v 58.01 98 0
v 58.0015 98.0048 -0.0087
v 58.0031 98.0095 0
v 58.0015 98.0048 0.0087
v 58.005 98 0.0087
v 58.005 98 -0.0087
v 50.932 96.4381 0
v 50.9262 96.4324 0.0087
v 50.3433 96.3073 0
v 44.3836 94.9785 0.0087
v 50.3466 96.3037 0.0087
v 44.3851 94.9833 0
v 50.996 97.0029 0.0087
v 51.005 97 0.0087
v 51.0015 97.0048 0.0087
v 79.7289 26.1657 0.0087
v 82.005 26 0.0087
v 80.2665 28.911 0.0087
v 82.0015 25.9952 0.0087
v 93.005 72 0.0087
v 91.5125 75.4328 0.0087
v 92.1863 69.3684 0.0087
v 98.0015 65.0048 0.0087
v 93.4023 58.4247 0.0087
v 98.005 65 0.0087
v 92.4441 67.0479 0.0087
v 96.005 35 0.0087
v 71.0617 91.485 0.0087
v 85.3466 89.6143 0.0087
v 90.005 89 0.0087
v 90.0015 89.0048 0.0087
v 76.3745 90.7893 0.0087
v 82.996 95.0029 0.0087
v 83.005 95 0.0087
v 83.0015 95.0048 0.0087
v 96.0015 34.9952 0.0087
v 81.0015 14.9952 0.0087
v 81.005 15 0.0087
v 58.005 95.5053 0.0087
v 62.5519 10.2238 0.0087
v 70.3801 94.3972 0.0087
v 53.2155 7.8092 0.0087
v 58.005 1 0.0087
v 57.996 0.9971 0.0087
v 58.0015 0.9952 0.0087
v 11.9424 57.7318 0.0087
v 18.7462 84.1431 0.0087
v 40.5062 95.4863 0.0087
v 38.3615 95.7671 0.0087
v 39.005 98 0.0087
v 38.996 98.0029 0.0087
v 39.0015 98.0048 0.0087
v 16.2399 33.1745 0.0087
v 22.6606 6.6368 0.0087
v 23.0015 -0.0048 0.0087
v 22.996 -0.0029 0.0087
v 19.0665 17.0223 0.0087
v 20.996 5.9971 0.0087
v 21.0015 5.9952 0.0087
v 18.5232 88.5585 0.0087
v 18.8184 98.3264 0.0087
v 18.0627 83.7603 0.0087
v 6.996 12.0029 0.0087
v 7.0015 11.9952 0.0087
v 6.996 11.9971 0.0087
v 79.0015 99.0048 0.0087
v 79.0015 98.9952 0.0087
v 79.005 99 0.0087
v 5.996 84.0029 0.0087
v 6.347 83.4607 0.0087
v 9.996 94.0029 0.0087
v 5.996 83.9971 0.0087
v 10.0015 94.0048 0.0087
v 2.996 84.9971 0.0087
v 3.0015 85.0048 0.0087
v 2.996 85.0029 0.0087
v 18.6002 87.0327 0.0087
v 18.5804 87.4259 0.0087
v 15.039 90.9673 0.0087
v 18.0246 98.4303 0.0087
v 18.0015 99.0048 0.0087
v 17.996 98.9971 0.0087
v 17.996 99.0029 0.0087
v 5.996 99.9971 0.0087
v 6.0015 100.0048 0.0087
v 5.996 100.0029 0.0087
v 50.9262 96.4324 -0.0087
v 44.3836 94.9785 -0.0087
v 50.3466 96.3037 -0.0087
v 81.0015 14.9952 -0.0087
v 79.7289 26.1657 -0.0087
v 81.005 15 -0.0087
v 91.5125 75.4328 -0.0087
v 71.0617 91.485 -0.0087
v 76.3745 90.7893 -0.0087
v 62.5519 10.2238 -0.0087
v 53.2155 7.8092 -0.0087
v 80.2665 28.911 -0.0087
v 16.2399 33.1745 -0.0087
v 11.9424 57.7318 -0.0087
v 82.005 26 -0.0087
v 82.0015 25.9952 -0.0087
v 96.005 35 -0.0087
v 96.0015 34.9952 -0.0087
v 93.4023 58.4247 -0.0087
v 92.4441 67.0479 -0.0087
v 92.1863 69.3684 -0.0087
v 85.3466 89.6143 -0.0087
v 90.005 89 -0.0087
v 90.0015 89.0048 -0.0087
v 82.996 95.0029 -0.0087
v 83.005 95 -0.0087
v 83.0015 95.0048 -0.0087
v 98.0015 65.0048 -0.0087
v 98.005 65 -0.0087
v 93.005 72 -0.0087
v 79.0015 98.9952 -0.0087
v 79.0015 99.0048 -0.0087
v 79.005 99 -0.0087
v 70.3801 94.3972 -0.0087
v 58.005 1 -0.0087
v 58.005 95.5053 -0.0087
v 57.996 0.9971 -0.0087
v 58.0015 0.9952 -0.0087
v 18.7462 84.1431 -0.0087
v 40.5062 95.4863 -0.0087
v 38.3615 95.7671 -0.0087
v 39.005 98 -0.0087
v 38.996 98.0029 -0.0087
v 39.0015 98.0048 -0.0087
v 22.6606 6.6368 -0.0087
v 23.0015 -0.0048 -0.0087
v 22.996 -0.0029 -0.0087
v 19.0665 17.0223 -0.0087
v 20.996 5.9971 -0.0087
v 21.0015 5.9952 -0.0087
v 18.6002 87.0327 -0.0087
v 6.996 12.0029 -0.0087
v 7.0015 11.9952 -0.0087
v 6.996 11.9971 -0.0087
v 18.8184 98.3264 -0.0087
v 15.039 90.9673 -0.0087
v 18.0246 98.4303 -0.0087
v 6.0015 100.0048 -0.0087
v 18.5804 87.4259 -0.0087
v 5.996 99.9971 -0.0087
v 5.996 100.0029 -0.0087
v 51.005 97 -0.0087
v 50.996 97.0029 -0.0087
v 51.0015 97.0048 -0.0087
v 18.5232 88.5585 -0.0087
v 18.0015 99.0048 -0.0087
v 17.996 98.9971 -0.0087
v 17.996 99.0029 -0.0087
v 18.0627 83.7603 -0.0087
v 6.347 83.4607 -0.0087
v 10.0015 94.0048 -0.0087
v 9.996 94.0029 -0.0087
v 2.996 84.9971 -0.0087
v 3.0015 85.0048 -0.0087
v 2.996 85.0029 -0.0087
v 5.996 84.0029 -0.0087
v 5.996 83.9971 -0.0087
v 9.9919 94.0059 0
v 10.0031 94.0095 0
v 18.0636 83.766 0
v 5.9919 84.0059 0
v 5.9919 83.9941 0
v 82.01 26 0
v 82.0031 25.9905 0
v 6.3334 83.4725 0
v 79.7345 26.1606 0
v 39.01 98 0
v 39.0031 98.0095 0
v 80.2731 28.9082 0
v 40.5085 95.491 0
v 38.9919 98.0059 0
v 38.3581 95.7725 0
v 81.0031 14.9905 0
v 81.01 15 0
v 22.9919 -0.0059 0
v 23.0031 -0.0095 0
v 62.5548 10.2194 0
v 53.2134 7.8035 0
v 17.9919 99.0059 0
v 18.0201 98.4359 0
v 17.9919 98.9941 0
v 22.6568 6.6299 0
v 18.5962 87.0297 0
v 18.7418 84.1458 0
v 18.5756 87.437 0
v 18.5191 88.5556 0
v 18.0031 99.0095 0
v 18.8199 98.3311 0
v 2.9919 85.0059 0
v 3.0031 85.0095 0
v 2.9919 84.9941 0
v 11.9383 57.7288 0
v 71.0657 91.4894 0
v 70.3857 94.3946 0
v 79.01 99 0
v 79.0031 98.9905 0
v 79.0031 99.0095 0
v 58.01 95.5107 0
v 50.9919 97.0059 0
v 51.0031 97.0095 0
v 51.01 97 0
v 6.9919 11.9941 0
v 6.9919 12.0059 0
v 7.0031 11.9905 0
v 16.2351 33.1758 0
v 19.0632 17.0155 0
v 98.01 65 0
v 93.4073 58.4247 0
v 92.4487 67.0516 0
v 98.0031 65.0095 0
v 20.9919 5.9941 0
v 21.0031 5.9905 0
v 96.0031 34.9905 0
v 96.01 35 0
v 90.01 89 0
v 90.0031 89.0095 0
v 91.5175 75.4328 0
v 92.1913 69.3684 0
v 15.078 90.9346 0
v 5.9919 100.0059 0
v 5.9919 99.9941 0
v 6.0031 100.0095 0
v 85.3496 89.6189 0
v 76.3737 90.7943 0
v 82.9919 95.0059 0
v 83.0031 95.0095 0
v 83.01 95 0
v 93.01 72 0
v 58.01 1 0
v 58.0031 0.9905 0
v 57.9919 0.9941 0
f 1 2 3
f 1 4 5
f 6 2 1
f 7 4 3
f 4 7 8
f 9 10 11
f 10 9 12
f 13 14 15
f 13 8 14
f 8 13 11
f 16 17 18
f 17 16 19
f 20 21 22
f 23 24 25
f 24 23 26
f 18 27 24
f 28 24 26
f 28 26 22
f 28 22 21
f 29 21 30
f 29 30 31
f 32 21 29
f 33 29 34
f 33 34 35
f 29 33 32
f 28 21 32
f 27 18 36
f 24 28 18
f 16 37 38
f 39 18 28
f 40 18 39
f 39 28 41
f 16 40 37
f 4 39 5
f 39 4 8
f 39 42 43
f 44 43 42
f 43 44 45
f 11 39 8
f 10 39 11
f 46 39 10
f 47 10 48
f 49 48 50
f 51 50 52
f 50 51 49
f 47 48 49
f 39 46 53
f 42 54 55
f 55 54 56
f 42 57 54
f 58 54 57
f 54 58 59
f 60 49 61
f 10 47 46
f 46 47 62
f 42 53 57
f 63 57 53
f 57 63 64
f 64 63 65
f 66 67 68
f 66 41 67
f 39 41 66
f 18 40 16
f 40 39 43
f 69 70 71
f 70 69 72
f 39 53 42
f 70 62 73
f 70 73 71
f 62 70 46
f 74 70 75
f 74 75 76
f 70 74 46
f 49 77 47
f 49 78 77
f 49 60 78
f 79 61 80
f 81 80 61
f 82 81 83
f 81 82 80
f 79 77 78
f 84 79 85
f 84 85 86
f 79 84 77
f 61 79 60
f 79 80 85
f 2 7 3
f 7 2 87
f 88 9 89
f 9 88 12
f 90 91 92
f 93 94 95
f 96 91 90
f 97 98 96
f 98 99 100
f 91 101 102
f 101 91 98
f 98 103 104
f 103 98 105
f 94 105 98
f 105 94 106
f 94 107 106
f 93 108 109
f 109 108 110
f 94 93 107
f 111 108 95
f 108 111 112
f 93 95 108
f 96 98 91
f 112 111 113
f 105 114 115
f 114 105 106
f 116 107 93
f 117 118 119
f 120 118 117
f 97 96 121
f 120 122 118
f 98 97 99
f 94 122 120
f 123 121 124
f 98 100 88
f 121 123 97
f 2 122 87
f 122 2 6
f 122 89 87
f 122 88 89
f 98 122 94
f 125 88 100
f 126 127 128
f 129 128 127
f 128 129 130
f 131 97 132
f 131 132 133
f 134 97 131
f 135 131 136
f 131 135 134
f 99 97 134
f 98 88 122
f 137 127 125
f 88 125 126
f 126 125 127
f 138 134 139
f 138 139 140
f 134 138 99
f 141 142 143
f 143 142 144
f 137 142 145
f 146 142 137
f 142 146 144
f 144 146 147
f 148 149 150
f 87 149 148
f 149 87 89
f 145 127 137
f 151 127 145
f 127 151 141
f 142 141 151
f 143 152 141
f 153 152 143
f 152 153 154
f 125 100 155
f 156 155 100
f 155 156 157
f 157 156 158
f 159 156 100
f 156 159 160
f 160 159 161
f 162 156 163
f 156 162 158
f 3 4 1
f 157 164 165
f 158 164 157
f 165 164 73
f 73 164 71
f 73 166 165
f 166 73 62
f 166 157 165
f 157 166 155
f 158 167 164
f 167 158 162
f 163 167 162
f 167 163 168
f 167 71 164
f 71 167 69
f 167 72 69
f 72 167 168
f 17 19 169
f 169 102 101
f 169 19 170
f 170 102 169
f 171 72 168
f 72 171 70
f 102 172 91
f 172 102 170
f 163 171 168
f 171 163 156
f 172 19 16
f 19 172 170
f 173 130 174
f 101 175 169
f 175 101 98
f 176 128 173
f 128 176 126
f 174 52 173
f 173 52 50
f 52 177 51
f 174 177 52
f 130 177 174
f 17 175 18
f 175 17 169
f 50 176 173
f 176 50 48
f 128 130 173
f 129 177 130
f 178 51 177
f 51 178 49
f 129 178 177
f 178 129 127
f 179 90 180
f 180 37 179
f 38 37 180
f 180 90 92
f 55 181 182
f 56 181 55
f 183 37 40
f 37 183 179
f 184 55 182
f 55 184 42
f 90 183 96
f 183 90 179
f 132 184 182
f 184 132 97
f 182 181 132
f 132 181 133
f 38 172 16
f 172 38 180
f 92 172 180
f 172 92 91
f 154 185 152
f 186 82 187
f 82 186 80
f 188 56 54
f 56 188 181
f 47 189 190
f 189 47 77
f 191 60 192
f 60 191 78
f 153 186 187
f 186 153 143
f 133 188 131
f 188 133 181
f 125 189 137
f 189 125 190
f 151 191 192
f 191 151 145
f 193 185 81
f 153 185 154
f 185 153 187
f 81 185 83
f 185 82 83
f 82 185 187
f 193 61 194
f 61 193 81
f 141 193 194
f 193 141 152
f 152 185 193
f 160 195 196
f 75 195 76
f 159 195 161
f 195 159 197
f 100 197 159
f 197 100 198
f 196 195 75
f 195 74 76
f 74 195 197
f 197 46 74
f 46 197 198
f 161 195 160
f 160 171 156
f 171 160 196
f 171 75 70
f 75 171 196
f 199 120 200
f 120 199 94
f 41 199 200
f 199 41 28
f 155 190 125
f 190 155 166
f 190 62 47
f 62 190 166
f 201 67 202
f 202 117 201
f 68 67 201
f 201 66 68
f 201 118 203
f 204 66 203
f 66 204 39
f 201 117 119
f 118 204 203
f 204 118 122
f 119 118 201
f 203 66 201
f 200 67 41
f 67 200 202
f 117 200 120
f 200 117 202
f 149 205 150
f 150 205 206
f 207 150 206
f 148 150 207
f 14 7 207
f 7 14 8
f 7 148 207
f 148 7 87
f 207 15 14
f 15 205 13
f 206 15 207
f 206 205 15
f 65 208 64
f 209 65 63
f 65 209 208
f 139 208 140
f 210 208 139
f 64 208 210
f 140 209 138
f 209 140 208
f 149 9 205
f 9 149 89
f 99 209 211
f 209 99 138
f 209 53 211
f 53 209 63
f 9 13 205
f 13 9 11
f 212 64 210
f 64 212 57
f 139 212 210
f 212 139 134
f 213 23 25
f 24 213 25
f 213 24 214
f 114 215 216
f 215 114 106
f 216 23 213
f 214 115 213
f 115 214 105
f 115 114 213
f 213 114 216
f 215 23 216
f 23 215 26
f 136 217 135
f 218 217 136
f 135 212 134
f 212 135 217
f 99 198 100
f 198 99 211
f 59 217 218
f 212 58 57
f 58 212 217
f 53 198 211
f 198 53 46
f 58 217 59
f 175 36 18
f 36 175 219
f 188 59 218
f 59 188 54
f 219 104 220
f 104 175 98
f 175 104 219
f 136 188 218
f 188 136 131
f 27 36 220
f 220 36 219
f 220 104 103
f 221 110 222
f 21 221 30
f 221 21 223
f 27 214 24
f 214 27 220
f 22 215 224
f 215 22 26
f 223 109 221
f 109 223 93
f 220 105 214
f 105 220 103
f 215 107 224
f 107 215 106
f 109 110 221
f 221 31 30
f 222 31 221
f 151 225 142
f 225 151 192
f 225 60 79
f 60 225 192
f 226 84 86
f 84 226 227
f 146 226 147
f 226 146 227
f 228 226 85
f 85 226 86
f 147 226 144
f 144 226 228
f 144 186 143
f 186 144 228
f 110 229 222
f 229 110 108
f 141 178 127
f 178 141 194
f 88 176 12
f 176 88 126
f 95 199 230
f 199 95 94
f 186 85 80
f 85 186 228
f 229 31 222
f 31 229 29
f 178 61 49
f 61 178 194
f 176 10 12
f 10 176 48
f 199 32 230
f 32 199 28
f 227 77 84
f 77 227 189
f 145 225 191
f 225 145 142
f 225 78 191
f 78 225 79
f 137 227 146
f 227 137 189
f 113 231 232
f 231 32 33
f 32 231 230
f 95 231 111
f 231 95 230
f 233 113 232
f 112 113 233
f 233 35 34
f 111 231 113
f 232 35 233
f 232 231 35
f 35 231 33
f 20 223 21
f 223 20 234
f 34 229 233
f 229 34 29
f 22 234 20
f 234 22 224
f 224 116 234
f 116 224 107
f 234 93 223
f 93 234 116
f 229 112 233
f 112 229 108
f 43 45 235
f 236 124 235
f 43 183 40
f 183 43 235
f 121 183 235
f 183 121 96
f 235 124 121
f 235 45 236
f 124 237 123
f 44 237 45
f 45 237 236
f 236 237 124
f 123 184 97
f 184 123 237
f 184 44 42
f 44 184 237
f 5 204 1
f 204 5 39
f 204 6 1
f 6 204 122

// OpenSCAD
color([0.6107800780239486,0.9541913078580654,0.09369719926319908]) hull(){
    translate([18,58]) sphere(0.01);
    translate([58,98]) sphere(0.01);
    translate([22,90]) sphere(0.01);
}
color([0.4396226851829427,0.9817497074141792,0.30111933510979894]) hull(){
    translate([58,98]) sphere(0.01);
    translate([22,90]) sphere(0.01);
    translate([50,93]) sphere(0.01);
}
color([0.08571041628526821,0.691130580335744,0.16573157374072334]) hull(){
    translate([22,90]) sphere(0.01);
    translate([50,93]) sphere(0.01);
    translate([44,55]) sphere(0.01);
}
color([0.4668304924867862,0.30100213617539295,0.3511677492745029]) hull(){
    translate([50,93]) sphere(0.01);
    translate([44,55]) sphere(0.01);
    translate([64,14]) sphere(0.01);
}
color([0.05564944269037686,0.7696481469448815,0.686275624239137]) hull(){
    translate([44,55]) sphere(0.01);
    translate([64,14]) sphere(0.01);
    translate([68,15]) sphere(0.01);
}
color([0.15447252119296884,0.35335085758162643,0.18799175914388588]) hull(){
    translate([64,14]) sphere(0.01);
    translate([68,15]) sphere(0.01);
    translate([10,94]) sphere(0.01);
}
color([0.41322879780265653,0.82270842281296,0.9057146612667819]) hull(){
    translate([68,15]) sphere(0.01);
    translate([10,94]) sphere(0.01);
    translate([58,33]) sphere(0.01);
}
color([0.9688547633127277,0.5528378273263655,0.12760284187612392]) hull(){
    translate([10,94]) sphere(0.01);
    translate([58,33]) sphere(0.01);
    translate([6,84]) sphere(0.01);
}
color([0.1710979555253146,0.7131998843266452,0.6397779425125977]) hull(){
    translate([58,33]) sphere(0.01);
    translate([6,84]) sphere(0.01);
    translate([82,26]) sphere(0.01);
}
color([0.57496968906483,0.8489371230716904,0.07944838941339594]) hull(){
    translate([6,84]) sphere(0.01);
    translate([82,26]) sphere(0.01);
    translate([42,29]) sphere(0.01);
}
color([0.040333123224873146,0.9305910632054132,0.3080440975445232]) hull(){
    translate([82,26]) sphere(0.01);
    translate([42,29]) sphere(0.01);
    translate([39,98]) sphere(0.01);
}
color([0.6084655882345898,0.4923441190446234,0.7069385087242315]) hull(){
    translate([42,29]) sphere(0.01);
    translate([39,98]) sphere(0.01);
    translate([26,22]) sphere(0.01);
}
color([0.6803385961846494,0.18024793645131376,0.10787678186317007]) hull(){
    translate([39,98]) sphere(0.01);
    translate([26,22]) sphere(0.01);
    translate([18,24]) sphere(0.01);
}
color([0.1335624130282893,0.47731112778056706,0.8393950916733898]) hull(){
    translate([26,22]) sphere(0.01);
    translate([18,24]) sphere(0.01);
    translate([44,47]) sphere(0.01);
}
color([0.6780893207968227,0.08337096158279222,0.27725115680544954]) hull(){
    translate([18,24]) sphere(0.01);
    translate([44,47]) sphere(0.01);
    translate([80,52]) sphere(0.01);
}
color([0.9965791662073833,0.03375154870506614,0.10494976972159242]) hull(){
    translate([44,47]) sphere(0.01);
    translate([80,52]) sphere(0.01);
    translate([26,51]) sphere(0.01);
}
color([0.516844917539197,0.1360610465034362,0.543805910213663]) hull(){
    translate([80,52]) sphere(0.01);
    translate([26,51]) sphere(0.01);
    translate([59,71]) sphere(0.01);
}
color([0.04901628196141694,0.4867102513994055,0.8813892002857401]) hull(){
    translate([26,51]) sphere(0.01);
    translate([59,71]) sphere(0.01);
    translate([35,48]) sphere(0.01);
}
color([0.3053751014353143,0.40772022041766365,0.31297204198076634]) hull(){
    translate([59,71]) sphere(0.01);
    translate([35,48]) sphere(0.01);
    translate([20,83]) sphere(0.01);
}
color([0.49907796034366436,0.6160709555012981,0.9916538905911245]) hull(){
    translate([35,48]) sphere(0.01);
    translate([20,83]) sphere(0.01);
    translate([81,15]) sphere(0.01);
}
color([0.3123575451593331,0.46364206475662195,0.8862899719975306]) hull(){
    translate([20,83]) sphere(0.01);
    translate([81,15]) sphere(0.01);
    translate([23,0]) sphere(0.01);
}
color([0.5738800220993816,0.8494037217359881,0.24323676398212035]) hull(){
    translate([81,15]) sphere(0.01);
    translate([23,0]) sphere(0.01);
    translate([77,50]) sphere(0.01);
}
color([0.8402878098664139,0.9530478541805099,0.16594803365564914]) hull(){
    translate([23,0]) sphere(0.01);
    translate([77,50]) sphere(0.01);
    translate([18,99]) sphere(0.01);
}
color([0.0023370868964924796,0.7387895340607371,0.5374530602666081]) hull(){
    translate([77,50]) sphere(0.01);
    translate([18,99]) sphere(0.01);
    translate([72,20]) sphere(0.01);
}
color([0.25604025835089217,0.4320068924153808,0.5112453323210508]) hull(){
    translate([18,99]) sphere(0.01);
    translate([72,20]) sphere(0.01);
    translate([24,21]) sphere(0.01);
}
color([0.7462272619347637,0.5039790716190428,0.8850839351693509]) hull(){
    translate([72,20]) sphere(0.01);
    translate([24,21]) sphere(0.01);
    translate([3,85]) sphere(0.01);
}
color([0.6652757233710683,0.22263754843686523,0.08942086350367451]) hull(){
    translate([24,21]) sphere(0.01);
    translate([3,85]) sphere(0.01);
    translate([30,57]) sphere(0.01);
}
color([0.6195232841458308,0.9036720387350747,0.7222923954673625]) hull(){
    translate([3,85]) sphere(0.01);
    translate([30,57]) sphere(0.01);
    translate([81,49]) sphere(0.01);
}
color([0.6665075097113882,0.5421139713900744,0.6943978877819516]) hull(){
    translate([30,57]) sphere(0.01);
    translate([81,49]) sphere(0.01);
    translate([16,79]) sphere(0.01);
}
color([0.9269770591996176,0.12480324665016229,0.8422397758241813]) hull(){
    translate([81,49]) sphere(0.01);
    translate([16,79]) sphere(0.01);
    translate([70,96]) sphere(0.01);
}
color([0.028249143050612435,0.8554899328562455,0.6212809598996976]) hull(){
    translate([16,79]) sphere(0.01);
    translate([70,96]) sphere(0.01);
    translate([6,77]) sphere(0.01);
}
color([0.6435486749275994,0.4857227915978113,0.2898251547629681]) hull(){
    translate([70,96]) sphere(0.01);
    translate([6,77]) sphere(0.01);
    translate([31,91]) sphere(0.01);
}
color([0.21709076393122206,0.4979948584580751,0.6176241526046676]) hull(){
    translate([6,77]) sphere(0.01);
    translate([31,91]) sphere(0.01);
    translate([79,99]) sphere(0.01);
}
color([0.4722249532281336,0.7228331534363125,0.6109414561657331]) hull(){
    translate([31,91]) sphere(0.01);
    translate([79,99]) sphere(0.01);
    translate([64,91]) sphere(0.01);
}
color([0.5330085163671737,0.6769359871291822,0.5973748769978083]) hull(){
    translate([79,99]) sphere(0.01);
    translate([64,91]) sphere(0.01);
    translate([37,88]) sphere(0.01);
}
color([0.14460255854654236,0.21273280877313017,0.8417179364881341]) hull(){
    translate([64,91]) sphere(0.01);
    translate([37,88]) sphere(0.01);
    translate([75,43]) sphere(0.01);
}
color([0.6300391880279899,0.5103677782275869,0.4479627161837708]) hull(){
    translate([37,88]) sphere(0.01);
    translate([75,43]) sphere(0.01);
    translate([67,87]) sphere(0.01);
}
color([0.2903518628620462,0.1744676713524972,0.5457372127765215]) hull(){
    translate([75,43]) sphere(0.01);
    translate([67,87]) sphere(0.01);
    translate([43,69]) sphere(0.01);
}
color([0.6340658375422632,0.7004271366493812,0.690956934786038]) hull(){
    translate([67,87]) sphere(0.01);
    translate([43,69]) sphere(0.01);
    translate([46,61]) sphere(0.01);
}
color([0.013948469234104865,0.8018456354370093,0.2607079205191076]) hull(){
    translate([43,69]) sphere(0.01);
    translate([46,61]) sphere(0.01);
    translate([51,97]) sphere(0.01);
}
color([0.01899716010339858,0.7507132946374245,0.44168653561511173]) hull(){
    translate([46,61]) sphere(0.01);
    translate([51,97]) sphere(0.01);
    translate([7,12]) sphere(0.01);
}
color([0.1668653701245908,0.45955837321901094,0.7876756969907556]) hull(){
    translate([51,97]) sphere(0.01);
    translate([7,12]) sphere(0.01);
    translate([38,83]) sphere(0.01);
}
color([0.09564527702692727,0.06733136152719421,0.7816649665975636]) hull(){
    translate([7,12]) sphere(0.01);
    translate([38,83]) sphere(0.01);
    translate([55,32]) sphere(0.01);
}
color([0.030385075649315252,0.33346286891595733,0.08647112242809318]) hull(){
    translate([38,83]) sphere(0.01);
    translate([55,32]) sphere(0.01);
    translate([30,90]) sphere(0.01);
}
color([0.8161439782233904,0.05657658467482607,0.8243668117903717]) hull(){
    translate([55,32]) sphere(0.01);
    translate([30,90]) sphere(0.01);
    translate([91,55]) sphere(0.01);
}
color([0.05808931884644186,0.6181904095369413,0.1426995958976538]) hull(){
    translate([30,90]) sphere(0.01);
    translate([91,55]) sphere(0.01);
    translate([98,65]) sphere(0.01);
}
color([0.3846464495954227,0.3794414211645075,0.7643773332264734]) hull(){
    translate([91,55]) sphere(0.01);
    translate([98,65]) sphere(0.01);
    translate([63,74]) sphere(0.01);
}
color([0.3116889002403487,0.7690158776827113,0.7674729074453902]) hull(){
    translate([98,65]) sphere(0.01);
    translate([63,74]) sphere(0.01);
    translate([32,18]) sphere(0.01);
}
color([0.3394448706328078,0.45855440081433096,0.0007502935671159783]) hull(){
    translate([63,74]) sphere(0.01);
    translate([32,18]) sphere(0.01);
    translate([7,86]) sphere(0.01);
}
color([0.8084995756647368,0.0331322283588068,0.9954935019736515]) hull(){
    translate([32,18]) sphere(0.01);
    translate([7,86]) sphere(0.01);
    translate([74,41]) sphere(0.01);
}
color([0.32750610520168044,0.511786711221762,0.09639677946248049]) hull(){
    translate([7,86]) sphere(0.01);
    translate([74,41]) sphere(0.01);
    translate([21,6]) sphere(0.01);
}
color([0.46647601470953737,0.043404226035316795,0.8089506697449751]) hull(){
    translate([74,41]) sphere(0.01);
    translate([21,6]) sphere(0.01);
    translate([96,35]) sphere(0.01);
}
color([0.9065579579370614,0.48874197586323487,0.4689182776921319]) hull(){
    translate([21,6]) sphere(0.01);
    translate([96,35]) sphere(0.01);
    translate([90,89]) sphere(0.01);
}
color([0.9999833648369341,0.42392948264922625,0.11056216143511133]) hull(){
    translate([96,35]) sphere(0.01);
    translate([90,89]) sphere(0.01);
    translate([15,91]) sphere(0.01);
}
color([0.5007484231317689,0.23725843071495933,0.7435751616565288]) hull(){
    translate([90,89]) sphere(0.01);
    translate([15,91]) sphere(0.01);
    translate([6,100]) sphere(0.01);
}
color([0.030326511183225713,0.9534383365251057,0.44454391677925087]) hull(){
    translate([15,91]) sphere(0.01);
    translate([6,100]) sphere(0.01);
    translate([76,28]) sphere(0.01);
}
color([0.4017260225039573,0.6984802625757133,0.14751428227125585]) hull(){
    translate([6,100]) sphere(0.01);
    translate([76,28]) sphere(0.01);
    translate([39,67]) sphere(0.01);
}
color([0.592053202978914,0.7602792343344718,0.23214841748979886]) hull(){
    translate([76,28]) sphere(0.01);
    translate([39,67]) sphere(0.01);
    translate([79,27]) sphere(0.01);
}
color([0.2215781656479593,0.24536616409996503,0.7021925659500807]) hull(){
    translate([39,67]) sphere(0.01);
    translate([79,27]) sphere(0.01);
    translate([83,95]) sphere(0.01);
}
color([0.5457605096294114,0.54011508338913,0.5459453680001618]) hull(){
    translate([79,27]) sphere(0.01);
    translate([83,95]) sphere(0.01);
    translate([93,72]) sphere(0.01);
}
color([0.21439919344985514,0.4167057873106884,0.6193494045718565]) hull(){
    translate([83,95]) sphere(0.01);
    translate([93,72]) sphere(0.01);
    translate([45,42]) sphere(0.01);
}
color([0.45760594266221877,0.8933837090972113,0.8109172526149769]) hull(){
    translate([93,72]) sphere(0.01);
    translate([45,42]) sphere(0.01);
    translate([58,1]) sphere(0.01);
}
color([0.14833972802097417,0.6068004170768148,0.5080529466064481]) hull(){
    translate([45,42]) sphere(0.01);
    translate([58,1]) sphere(0.01);
    translate([18,58]) sphere(0.01);
}
color([0.9906187087676633,0.11352393843166497,0.6883720652754897]) hull(){
    translate([58,1]) sphere(0.01);
    translate([18,58]) sphere(0.01);
    translate([58,98]) sphere(0.01);
}
